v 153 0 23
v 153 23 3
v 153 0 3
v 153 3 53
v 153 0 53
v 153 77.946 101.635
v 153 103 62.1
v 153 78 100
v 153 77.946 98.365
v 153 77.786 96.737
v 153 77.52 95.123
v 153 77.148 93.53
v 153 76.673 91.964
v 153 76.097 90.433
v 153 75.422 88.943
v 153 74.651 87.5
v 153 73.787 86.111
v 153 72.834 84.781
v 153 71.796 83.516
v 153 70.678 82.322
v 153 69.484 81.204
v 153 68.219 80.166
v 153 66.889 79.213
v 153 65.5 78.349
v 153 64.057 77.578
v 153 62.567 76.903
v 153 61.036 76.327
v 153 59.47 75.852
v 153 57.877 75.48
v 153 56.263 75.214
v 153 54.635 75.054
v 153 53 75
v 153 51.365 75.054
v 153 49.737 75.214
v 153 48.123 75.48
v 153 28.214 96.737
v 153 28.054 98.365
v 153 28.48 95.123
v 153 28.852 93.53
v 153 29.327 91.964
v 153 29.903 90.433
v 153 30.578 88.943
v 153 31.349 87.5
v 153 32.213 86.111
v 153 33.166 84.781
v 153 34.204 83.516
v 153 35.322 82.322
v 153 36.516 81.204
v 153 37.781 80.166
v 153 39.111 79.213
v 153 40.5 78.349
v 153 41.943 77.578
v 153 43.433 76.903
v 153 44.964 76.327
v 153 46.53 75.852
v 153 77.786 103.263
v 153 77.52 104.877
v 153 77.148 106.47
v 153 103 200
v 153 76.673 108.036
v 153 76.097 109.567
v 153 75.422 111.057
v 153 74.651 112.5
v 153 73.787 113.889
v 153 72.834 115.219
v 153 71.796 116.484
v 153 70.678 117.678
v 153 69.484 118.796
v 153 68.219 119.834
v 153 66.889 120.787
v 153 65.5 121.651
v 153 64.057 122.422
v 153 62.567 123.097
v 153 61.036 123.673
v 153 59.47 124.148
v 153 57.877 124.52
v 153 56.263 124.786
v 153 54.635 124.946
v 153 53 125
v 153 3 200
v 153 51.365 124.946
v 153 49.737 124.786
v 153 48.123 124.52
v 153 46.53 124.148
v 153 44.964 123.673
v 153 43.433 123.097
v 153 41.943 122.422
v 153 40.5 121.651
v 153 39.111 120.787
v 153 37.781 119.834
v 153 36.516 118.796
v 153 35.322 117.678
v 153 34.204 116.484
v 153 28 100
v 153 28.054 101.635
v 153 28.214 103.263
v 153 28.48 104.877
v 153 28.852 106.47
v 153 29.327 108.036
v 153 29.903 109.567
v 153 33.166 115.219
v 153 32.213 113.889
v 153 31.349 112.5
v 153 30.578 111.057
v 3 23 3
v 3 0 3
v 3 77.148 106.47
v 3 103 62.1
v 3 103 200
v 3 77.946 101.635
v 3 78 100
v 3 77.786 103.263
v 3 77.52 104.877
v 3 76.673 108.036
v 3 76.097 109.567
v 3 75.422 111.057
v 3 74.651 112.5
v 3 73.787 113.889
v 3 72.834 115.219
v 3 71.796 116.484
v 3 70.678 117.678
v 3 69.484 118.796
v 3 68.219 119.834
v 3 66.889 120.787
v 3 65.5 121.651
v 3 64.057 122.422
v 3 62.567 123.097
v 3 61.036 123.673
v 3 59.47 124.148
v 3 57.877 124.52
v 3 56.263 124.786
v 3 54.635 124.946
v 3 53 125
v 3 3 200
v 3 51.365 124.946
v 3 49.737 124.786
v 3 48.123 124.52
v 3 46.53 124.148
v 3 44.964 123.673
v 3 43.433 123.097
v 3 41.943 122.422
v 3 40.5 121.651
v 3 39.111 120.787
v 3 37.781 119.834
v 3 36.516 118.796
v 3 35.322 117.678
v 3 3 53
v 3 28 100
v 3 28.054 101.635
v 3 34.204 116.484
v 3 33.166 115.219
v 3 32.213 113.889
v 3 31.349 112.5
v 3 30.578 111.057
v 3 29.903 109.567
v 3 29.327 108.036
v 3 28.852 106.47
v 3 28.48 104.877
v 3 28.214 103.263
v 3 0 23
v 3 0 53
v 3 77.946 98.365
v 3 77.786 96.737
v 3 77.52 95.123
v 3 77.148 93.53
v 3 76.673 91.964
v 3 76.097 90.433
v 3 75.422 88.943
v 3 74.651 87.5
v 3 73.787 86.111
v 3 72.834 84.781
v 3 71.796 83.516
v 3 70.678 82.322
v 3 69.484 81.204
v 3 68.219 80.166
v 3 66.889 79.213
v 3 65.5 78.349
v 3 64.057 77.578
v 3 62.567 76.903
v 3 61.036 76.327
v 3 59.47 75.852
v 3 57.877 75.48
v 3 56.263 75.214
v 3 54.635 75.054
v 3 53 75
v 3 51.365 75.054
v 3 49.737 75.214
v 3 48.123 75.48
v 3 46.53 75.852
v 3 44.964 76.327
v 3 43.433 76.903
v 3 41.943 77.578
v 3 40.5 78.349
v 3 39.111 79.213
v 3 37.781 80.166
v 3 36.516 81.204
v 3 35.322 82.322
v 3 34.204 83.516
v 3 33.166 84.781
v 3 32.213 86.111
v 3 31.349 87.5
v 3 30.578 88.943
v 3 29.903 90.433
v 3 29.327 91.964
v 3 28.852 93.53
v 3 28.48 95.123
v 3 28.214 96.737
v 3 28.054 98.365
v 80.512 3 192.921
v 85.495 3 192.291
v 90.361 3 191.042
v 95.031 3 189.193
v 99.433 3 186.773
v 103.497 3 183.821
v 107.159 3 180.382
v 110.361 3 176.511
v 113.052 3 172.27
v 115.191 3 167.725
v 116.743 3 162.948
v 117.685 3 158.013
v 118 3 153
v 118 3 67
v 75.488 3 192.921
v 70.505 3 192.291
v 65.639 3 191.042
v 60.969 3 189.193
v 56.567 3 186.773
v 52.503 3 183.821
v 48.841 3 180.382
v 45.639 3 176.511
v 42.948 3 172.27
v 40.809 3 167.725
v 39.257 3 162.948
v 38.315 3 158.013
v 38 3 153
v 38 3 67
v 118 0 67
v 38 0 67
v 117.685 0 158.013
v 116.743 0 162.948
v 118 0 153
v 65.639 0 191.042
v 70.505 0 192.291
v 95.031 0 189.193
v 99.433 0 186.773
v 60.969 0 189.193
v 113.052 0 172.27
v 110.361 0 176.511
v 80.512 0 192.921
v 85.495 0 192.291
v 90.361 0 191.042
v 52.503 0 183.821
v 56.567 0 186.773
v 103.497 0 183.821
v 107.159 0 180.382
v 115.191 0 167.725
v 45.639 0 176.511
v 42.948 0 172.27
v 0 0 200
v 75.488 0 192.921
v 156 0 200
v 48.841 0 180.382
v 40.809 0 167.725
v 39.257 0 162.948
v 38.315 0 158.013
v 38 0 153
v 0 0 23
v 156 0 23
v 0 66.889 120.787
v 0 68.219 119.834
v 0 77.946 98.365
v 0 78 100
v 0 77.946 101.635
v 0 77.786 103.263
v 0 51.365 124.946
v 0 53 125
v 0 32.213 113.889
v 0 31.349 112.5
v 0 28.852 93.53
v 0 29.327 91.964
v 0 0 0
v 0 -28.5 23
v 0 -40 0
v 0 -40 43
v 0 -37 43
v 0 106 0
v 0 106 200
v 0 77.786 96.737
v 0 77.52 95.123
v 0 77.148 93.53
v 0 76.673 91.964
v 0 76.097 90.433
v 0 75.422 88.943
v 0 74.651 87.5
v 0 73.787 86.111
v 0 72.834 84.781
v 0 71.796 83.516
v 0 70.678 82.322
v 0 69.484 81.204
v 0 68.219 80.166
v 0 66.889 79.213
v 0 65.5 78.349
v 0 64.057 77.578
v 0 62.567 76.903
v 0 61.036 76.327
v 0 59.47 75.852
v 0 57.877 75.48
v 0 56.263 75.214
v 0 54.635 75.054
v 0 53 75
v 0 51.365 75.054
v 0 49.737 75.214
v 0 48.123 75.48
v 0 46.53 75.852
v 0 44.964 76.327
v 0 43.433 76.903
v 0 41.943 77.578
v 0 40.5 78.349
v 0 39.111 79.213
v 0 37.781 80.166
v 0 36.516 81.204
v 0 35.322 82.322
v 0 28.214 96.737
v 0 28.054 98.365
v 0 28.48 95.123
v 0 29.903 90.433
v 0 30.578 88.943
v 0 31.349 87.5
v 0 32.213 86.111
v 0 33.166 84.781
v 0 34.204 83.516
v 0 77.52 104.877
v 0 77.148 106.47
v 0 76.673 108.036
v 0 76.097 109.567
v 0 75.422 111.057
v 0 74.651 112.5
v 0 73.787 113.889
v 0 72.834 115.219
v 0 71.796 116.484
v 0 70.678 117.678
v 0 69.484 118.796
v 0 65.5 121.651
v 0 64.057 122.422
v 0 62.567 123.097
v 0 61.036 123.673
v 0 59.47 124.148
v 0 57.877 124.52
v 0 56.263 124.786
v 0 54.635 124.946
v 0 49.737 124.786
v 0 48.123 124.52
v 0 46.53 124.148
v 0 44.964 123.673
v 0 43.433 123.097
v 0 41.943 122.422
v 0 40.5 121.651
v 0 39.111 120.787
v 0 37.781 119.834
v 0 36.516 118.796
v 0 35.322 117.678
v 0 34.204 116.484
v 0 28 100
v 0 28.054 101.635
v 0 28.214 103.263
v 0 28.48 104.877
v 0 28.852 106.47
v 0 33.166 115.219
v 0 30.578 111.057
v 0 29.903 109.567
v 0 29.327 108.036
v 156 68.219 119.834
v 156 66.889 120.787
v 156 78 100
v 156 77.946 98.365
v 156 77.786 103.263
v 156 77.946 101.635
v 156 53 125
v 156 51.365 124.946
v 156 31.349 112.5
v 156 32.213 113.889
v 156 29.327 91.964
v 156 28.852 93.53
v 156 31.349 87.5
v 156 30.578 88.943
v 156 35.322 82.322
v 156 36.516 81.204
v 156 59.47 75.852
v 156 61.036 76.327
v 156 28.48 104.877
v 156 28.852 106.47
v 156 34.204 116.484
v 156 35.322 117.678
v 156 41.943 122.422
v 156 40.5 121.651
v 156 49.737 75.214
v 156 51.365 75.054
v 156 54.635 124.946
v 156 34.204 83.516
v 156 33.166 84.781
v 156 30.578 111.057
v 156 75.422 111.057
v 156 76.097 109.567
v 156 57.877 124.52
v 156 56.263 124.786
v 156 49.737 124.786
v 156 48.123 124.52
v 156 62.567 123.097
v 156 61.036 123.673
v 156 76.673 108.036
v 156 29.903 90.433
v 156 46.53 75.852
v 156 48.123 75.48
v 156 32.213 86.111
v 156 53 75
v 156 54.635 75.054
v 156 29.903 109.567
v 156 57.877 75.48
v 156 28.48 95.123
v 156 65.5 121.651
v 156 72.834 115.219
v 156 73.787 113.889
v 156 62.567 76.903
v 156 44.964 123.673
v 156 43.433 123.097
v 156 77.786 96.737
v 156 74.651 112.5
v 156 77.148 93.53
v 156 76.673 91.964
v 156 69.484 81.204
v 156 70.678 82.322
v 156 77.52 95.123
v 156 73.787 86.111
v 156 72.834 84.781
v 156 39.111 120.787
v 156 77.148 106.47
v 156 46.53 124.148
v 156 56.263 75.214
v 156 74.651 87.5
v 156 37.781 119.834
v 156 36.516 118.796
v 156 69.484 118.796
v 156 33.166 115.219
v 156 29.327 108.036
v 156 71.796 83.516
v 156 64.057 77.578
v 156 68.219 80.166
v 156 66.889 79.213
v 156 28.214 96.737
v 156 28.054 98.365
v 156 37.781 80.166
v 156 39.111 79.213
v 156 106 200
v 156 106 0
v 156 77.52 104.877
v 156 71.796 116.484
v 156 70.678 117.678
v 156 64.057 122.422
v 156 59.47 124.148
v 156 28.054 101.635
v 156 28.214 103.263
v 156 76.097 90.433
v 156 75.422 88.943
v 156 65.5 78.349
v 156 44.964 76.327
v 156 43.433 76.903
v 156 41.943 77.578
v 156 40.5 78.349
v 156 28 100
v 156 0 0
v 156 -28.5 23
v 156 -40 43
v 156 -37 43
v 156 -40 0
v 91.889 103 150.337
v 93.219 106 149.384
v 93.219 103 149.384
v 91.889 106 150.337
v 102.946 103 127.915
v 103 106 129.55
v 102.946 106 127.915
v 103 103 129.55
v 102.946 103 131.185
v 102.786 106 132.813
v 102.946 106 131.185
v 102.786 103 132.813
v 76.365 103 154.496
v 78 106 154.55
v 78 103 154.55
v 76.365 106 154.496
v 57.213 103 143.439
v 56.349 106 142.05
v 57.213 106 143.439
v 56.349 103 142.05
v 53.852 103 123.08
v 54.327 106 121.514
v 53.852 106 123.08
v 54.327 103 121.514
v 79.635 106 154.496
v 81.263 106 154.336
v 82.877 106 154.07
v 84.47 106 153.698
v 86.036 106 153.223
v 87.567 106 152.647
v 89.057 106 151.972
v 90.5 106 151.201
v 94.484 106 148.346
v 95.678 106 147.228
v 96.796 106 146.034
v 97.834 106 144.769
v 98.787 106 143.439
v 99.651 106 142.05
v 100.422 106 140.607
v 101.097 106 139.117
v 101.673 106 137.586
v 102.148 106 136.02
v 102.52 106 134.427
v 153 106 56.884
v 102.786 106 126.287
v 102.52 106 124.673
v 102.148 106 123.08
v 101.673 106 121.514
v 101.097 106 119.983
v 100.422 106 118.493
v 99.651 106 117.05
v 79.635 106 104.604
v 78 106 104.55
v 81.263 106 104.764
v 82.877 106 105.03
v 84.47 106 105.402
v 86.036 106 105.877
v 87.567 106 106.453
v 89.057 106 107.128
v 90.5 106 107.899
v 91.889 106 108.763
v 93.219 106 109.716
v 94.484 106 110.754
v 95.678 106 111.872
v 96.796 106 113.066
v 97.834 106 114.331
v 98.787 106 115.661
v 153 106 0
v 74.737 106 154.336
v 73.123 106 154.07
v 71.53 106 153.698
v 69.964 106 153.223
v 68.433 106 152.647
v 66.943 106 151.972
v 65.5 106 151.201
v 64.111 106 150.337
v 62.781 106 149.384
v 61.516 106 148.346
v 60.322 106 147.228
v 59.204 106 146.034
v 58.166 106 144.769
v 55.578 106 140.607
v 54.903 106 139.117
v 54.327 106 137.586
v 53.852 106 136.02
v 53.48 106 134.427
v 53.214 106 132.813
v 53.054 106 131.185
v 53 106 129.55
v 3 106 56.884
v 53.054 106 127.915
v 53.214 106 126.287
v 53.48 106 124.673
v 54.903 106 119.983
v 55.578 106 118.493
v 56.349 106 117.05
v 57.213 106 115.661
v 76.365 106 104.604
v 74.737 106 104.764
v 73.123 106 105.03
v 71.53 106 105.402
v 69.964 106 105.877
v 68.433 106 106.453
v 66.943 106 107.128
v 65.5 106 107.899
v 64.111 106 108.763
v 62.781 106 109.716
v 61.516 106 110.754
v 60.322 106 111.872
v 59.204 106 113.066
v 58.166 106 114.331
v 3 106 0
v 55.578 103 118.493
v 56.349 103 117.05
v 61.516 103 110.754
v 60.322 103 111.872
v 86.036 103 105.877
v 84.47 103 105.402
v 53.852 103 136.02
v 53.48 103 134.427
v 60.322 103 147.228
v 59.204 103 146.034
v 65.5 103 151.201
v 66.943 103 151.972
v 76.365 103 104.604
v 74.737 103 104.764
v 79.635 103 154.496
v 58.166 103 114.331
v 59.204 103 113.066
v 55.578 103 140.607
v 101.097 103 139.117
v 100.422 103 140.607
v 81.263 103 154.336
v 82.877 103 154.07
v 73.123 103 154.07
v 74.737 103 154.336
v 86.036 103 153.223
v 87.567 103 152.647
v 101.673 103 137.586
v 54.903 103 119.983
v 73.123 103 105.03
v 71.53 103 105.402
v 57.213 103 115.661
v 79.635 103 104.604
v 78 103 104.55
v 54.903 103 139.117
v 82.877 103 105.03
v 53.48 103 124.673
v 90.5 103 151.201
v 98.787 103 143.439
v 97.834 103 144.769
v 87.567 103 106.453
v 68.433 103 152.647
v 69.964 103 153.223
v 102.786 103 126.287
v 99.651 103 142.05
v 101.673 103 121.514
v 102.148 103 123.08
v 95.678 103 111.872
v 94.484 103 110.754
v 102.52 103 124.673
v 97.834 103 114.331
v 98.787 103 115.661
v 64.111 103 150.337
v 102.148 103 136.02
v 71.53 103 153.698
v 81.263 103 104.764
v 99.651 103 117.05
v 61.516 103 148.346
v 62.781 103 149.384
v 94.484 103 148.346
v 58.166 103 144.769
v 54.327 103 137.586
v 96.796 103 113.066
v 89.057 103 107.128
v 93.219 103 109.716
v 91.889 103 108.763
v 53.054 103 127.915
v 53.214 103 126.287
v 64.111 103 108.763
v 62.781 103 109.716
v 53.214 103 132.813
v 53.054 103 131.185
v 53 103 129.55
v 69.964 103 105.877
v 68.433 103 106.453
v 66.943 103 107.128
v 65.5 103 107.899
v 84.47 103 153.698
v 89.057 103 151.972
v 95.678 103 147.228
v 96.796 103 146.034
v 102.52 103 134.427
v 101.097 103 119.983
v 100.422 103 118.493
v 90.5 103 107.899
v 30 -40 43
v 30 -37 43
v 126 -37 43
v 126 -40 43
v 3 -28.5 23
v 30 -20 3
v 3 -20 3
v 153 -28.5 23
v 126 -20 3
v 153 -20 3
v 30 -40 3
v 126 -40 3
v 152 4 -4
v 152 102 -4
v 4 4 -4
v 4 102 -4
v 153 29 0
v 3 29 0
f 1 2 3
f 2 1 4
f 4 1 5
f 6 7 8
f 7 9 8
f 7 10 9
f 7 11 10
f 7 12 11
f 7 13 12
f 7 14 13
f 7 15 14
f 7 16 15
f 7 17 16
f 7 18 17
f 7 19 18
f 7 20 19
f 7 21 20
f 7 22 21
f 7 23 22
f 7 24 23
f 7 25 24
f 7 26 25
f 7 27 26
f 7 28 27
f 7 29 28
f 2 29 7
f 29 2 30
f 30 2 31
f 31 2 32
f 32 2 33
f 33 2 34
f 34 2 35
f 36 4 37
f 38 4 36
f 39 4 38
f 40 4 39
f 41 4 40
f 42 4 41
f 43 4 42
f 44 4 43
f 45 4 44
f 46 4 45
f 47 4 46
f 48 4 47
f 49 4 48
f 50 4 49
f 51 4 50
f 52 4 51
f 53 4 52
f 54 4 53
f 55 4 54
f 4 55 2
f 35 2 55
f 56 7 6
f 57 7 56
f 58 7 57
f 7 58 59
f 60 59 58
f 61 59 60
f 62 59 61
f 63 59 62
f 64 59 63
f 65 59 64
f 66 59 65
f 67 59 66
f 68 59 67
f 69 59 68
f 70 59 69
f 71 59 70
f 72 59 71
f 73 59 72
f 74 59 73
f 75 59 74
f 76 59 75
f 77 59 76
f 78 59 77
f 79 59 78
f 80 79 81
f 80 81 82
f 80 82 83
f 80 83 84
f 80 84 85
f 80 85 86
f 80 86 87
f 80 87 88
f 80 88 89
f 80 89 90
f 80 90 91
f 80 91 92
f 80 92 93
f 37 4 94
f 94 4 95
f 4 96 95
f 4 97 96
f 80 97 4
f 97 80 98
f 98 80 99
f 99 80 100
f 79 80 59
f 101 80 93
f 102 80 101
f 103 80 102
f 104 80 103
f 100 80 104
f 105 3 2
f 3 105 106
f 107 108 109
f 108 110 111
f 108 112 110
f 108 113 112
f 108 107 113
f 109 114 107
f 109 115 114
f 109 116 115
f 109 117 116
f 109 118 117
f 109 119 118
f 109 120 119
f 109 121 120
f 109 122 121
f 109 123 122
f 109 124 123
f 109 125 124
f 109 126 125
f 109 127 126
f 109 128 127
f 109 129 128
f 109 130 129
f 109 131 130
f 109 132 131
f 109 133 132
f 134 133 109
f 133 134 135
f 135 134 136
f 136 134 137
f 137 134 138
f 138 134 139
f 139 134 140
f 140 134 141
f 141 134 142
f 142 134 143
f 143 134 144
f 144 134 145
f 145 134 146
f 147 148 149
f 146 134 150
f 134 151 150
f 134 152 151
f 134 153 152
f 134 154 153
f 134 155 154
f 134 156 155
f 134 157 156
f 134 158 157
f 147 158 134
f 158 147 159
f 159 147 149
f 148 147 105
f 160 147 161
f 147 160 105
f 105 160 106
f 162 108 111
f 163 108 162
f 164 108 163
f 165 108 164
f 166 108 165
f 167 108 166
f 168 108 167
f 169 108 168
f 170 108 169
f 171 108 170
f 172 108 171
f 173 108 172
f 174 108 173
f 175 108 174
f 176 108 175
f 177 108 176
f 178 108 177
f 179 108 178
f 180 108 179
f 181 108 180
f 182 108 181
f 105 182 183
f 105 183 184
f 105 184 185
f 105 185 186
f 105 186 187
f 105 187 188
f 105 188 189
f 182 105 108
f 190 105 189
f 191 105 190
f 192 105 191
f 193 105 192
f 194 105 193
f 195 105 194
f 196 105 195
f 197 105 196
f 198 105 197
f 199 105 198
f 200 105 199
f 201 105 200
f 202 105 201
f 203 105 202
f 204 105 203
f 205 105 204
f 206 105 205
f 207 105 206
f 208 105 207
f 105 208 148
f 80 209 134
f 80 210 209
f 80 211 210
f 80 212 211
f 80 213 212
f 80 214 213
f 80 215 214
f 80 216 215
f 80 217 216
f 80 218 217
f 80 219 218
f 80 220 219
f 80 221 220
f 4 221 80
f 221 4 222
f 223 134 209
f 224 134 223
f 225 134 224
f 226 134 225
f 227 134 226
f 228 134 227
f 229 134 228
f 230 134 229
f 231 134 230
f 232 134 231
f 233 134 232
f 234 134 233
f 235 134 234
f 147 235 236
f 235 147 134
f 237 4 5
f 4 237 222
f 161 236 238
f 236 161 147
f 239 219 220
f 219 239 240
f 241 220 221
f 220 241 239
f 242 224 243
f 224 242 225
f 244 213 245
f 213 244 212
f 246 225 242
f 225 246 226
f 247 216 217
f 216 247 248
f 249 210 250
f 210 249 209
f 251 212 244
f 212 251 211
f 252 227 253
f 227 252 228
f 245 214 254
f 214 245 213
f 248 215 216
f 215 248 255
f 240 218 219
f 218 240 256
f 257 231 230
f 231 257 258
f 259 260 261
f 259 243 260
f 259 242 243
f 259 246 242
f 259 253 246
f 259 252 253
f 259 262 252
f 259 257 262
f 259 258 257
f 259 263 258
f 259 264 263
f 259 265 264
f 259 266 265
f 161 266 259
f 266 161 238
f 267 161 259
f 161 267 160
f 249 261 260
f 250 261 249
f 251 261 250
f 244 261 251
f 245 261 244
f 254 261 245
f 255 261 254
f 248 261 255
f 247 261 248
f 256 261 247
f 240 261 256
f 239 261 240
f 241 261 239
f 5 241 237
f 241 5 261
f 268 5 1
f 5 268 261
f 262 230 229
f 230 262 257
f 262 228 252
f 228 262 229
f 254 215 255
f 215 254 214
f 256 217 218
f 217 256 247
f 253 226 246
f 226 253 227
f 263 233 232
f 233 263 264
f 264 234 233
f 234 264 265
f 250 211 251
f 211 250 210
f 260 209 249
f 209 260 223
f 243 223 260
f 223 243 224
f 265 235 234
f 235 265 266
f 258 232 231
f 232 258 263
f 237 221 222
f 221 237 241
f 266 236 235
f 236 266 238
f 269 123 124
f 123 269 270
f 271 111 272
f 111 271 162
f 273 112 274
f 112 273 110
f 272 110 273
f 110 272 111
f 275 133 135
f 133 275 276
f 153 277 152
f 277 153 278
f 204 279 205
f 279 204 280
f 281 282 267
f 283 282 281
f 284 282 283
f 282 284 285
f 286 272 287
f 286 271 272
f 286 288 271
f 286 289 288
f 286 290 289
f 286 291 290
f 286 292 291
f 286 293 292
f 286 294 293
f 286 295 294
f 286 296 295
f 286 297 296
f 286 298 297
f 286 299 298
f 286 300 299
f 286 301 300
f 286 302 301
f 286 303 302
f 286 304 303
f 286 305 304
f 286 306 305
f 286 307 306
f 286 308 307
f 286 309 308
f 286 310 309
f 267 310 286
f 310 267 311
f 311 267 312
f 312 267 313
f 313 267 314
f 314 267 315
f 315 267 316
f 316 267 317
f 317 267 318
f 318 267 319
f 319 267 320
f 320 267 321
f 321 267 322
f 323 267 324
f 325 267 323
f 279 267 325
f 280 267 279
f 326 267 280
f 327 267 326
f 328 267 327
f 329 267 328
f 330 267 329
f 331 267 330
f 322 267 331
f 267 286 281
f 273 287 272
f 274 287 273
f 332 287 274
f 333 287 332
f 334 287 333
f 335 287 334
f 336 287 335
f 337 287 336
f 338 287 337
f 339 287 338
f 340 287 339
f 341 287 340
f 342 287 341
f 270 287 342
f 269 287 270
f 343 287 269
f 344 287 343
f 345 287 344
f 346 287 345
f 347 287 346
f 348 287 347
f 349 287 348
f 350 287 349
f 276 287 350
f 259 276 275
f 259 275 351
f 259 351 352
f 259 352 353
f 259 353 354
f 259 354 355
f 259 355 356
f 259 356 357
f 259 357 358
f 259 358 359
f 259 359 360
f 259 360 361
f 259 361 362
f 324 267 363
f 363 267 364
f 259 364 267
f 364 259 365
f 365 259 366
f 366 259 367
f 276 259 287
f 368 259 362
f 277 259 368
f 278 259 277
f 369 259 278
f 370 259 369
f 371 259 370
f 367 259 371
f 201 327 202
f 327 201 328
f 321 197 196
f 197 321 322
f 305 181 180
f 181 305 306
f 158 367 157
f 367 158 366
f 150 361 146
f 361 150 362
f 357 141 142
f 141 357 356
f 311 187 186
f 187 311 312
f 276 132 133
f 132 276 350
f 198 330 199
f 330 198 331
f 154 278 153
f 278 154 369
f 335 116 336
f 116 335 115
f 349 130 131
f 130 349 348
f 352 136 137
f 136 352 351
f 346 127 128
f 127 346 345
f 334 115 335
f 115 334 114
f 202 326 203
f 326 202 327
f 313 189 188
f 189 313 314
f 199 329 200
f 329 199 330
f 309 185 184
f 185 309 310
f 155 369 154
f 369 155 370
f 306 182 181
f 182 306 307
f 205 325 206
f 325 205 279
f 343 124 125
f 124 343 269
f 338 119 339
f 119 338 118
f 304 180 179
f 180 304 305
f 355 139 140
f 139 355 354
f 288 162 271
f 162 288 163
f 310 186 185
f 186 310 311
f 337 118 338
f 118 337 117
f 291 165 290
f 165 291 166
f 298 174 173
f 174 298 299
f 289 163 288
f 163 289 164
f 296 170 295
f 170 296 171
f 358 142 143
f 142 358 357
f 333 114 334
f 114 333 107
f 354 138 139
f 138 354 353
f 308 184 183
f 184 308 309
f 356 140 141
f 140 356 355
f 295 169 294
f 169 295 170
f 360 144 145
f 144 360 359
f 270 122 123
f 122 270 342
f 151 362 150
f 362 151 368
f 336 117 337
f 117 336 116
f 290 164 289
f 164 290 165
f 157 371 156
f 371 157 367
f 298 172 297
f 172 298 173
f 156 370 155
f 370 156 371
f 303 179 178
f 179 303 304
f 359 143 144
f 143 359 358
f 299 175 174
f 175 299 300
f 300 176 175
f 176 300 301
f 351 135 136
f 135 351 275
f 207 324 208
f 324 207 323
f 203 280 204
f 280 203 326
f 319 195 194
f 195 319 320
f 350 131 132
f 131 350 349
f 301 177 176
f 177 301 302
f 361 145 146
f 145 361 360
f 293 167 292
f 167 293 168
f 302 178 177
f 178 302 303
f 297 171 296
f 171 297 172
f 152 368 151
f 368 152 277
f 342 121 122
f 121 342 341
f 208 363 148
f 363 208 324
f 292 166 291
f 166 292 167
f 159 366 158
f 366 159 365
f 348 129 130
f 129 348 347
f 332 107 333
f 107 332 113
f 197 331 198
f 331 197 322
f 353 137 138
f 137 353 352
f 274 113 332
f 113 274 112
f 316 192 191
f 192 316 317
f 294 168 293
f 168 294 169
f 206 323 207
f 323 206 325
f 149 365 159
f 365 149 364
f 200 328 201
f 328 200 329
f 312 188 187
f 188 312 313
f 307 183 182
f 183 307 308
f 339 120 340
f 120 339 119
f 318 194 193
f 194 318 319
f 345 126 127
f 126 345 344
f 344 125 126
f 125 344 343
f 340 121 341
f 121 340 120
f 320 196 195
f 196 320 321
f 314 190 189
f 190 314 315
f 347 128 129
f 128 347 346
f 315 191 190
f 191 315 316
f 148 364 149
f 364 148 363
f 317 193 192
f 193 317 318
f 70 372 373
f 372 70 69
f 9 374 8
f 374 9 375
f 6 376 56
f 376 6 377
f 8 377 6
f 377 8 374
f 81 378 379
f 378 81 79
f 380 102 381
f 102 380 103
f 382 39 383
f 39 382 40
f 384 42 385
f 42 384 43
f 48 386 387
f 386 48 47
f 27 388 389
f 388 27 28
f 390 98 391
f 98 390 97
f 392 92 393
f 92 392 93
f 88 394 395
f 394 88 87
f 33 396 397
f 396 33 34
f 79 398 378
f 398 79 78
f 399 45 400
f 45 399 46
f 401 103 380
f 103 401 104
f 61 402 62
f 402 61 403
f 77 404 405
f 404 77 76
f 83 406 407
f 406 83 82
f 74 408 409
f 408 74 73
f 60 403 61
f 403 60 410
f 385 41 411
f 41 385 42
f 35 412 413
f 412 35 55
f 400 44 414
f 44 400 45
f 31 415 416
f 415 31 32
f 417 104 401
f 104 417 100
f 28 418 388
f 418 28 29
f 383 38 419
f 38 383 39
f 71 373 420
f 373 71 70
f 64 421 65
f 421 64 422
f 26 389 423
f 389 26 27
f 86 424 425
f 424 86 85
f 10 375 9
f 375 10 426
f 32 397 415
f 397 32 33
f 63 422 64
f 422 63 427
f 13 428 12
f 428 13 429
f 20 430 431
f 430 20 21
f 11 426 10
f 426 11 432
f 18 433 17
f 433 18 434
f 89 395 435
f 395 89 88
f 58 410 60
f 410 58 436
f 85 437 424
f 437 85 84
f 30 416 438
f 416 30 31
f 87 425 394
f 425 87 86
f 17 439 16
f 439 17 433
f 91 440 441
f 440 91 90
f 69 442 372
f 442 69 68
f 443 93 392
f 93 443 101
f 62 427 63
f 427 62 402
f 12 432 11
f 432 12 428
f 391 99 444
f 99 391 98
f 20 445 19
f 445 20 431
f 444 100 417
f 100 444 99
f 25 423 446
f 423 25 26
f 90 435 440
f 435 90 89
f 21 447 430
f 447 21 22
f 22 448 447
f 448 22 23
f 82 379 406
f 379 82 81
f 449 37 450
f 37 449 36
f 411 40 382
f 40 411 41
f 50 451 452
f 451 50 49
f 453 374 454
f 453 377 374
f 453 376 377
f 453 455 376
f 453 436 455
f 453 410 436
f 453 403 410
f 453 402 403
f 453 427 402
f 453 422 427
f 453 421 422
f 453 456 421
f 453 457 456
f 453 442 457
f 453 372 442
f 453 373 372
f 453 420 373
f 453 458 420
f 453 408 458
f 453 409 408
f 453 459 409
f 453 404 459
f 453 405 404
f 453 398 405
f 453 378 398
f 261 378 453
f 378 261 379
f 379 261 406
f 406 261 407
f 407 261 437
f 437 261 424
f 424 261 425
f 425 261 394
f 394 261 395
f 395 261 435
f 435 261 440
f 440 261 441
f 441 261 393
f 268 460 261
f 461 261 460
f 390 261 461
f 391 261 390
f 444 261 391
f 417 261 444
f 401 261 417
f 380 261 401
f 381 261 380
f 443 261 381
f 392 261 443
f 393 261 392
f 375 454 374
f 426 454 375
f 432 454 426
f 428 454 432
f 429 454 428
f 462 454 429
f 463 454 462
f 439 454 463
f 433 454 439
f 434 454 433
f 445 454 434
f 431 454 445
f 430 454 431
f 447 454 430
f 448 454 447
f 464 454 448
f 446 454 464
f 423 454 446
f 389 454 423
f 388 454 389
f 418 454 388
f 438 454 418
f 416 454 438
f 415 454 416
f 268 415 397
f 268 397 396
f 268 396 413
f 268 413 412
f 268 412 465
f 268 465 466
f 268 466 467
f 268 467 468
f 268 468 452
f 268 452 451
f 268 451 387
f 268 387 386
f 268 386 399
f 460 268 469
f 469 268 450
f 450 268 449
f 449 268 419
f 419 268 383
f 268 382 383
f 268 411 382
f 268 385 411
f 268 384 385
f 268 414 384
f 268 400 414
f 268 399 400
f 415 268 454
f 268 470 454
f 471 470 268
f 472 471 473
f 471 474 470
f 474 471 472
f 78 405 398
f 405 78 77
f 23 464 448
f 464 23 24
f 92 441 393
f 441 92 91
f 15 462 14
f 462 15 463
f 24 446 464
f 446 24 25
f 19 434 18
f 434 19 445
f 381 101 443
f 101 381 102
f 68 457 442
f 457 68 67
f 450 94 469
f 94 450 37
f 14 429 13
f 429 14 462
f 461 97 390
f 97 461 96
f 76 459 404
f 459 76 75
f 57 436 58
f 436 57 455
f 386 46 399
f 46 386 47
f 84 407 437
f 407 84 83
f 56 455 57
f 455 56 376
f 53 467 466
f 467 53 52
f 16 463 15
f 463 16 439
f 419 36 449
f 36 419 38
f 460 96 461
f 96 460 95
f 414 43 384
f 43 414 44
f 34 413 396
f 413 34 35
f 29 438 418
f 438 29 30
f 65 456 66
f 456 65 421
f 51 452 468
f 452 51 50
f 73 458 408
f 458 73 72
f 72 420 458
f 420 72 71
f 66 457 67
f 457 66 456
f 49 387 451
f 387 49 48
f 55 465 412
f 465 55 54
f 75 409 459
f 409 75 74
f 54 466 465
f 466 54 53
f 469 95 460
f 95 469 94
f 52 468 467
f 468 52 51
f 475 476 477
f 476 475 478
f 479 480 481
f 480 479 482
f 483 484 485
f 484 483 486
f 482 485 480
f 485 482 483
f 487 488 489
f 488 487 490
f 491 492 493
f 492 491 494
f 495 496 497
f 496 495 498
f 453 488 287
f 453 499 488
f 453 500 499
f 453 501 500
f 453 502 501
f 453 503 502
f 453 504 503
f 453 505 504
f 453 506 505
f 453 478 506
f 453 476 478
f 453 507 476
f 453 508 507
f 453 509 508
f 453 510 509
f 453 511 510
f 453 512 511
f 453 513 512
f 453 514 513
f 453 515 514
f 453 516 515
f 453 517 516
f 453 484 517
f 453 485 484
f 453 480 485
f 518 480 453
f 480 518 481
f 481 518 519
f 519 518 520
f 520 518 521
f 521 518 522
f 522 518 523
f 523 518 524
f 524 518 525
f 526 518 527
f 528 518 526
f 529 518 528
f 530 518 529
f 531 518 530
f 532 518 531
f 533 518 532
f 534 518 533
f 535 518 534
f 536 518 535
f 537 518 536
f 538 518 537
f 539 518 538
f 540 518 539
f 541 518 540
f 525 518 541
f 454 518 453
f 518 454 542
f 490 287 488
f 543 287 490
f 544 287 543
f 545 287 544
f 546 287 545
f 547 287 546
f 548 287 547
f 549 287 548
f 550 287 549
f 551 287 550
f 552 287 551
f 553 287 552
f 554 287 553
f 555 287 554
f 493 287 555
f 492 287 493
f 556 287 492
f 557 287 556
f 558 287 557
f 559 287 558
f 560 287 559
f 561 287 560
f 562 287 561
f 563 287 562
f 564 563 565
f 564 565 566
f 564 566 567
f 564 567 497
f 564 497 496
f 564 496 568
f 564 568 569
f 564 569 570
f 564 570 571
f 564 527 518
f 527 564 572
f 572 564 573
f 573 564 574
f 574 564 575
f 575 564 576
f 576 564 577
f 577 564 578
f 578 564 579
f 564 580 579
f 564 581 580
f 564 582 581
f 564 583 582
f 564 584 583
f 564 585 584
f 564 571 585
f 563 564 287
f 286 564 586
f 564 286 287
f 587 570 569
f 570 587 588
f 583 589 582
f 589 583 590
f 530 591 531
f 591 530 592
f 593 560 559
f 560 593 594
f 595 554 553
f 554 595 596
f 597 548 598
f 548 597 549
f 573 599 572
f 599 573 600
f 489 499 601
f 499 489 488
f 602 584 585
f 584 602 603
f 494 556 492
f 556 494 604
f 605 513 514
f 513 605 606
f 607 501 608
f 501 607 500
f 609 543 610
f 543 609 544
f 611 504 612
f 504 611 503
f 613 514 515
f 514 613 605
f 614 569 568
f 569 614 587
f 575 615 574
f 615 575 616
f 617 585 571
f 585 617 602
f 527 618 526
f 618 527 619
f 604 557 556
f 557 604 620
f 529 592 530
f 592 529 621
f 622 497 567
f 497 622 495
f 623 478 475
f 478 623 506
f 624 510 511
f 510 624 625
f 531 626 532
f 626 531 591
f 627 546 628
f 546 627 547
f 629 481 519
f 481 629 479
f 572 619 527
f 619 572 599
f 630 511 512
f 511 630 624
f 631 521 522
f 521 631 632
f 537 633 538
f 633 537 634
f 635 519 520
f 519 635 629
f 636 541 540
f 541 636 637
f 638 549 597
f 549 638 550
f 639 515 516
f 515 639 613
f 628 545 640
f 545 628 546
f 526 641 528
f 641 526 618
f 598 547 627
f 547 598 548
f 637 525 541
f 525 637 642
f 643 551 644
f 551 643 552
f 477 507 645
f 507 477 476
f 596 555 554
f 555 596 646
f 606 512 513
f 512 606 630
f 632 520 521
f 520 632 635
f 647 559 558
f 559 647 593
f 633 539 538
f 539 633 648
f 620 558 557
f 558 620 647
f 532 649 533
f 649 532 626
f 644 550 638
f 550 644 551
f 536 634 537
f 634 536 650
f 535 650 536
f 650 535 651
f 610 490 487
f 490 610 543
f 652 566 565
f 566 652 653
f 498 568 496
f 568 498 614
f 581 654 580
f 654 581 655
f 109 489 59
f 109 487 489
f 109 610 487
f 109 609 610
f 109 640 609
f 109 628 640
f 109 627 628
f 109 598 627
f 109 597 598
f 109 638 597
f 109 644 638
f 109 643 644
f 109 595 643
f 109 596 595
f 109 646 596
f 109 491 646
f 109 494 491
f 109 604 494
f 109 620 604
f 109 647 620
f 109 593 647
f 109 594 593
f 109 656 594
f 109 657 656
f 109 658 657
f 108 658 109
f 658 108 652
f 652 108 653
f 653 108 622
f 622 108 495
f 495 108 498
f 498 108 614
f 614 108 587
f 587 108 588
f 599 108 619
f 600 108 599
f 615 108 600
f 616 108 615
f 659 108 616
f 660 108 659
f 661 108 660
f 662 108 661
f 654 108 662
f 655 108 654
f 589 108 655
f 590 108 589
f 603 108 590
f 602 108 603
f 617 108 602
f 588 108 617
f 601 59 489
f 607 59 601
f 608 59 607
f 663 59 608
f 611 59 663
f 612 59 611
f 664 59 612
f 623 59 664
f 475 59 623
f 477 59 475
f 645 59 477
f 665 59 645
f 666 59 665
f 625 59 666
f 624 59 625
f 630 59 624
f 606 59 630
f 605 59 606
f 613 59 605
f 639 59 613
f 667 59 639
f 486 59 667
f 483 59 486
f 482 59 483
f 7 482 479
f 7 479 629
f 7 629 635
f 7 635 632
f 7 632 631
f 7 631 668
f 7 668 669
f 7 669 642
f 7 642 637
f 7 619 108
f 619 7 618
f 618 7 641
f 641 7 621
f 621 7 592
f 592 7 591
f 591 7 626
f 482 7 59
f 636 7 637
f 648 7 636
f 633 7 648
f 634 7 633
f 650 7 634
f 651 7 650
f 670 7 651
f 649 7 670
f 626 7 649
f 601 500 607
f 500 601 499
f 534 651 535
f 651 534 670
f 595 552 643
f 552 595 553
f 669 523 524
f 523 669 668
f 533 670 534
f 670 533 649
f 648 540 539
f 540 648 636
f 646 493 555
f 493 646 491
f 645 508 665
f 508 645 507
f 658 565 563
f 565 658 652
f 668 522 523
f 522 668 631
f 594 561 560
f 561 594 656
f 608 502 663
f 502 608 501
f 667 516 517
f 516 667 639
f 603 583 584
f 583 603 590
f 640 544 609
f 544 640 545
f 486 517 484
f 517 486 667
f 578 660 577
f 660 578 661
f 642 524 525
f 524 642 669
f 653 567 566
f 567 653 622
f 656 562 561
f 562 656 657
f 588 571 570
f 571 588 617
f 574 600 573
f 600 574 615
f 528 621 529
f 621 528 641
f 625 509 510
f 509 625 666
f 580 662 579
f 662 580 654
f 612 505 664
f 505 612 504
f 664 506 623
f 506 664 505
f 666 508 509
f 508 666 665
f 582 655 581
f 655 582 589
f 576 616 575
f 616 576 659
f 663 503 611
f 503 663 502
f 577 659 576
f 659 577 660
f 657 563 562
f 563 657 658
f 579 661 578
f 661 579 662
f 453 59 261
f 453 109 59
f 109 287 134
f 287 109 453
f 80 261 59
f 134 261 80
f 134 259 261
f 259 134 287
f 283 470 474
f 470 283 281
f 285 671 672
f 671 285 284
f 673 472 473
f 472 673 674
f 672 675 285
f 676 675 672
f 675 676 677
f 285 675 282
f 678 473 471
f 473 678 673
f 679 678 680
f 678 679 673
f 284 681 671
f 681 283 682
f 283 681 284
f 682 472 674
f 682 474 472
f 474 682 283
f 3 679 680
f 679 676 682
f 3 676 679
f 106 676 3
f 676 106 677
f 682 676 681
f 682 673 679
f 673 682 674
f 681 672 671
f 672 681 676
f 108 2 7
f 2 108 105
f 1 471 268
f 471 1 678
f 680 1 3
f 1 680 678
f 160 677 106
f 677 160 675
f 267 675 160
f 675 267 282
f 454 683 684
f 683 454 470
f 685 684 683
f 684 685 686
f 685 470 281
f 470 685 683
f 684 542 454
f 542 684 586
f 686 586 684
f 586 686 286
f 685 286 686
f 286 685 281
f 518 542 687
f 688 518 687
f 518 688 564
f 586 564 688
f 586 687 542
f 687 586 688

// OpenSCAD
/* [Container Parameters] */
Inner_Width = 150;  // Width of the container in millimeters
Inner_Depth = 100;  // Depth of the container in millimeters
Outer_Height = 200  ;  // Height of the container in millimeters
Wall_Thickness = 3;  // Thickness of the container walls in millimeters
Opening_Height = 50;  // Height of the opening at the top in millimeters
Add_Inset_Bottom = true; 

/* [Ramp Parameters] */
// Ratio of the ramp height to the inner height
Ramp_Height_Ratio = 0.3; //[0 : 0.01 : 0.99]
// Ratio of the ramp depth to the inner depth 
Ramp_Depth_Ratio = 0.8;  //[0 : 0.01 : 0.99]

/* [Landing and Stopper Parameters] */
Landing_Length = 40; // Length of the landing in millimeters
Stopper_Length = 20; // Length of the stopper ramp in millimeters
Stopper_Height = 40; // Height of the stopper ramp in millimeters
Stopper_Bar_Width = 30; // Width of the stopper bars in millimeters


/* [Front Cutout Parameters] */
// If true, the container has a front top cutout
Add_Top_Cutout = false; 
// If true, you customize the front vertical cutout
Customize_Front_Cutout = true;
// Width of the front vertical cutout in millimeters
Front_VC_Width = 80; // [0 : 1 : 500]
// Height of the front vertical cutout in millimeters
Front_VC_Height = 200; // [0 : 1 : 500]
// Height of the lower triangular cutout in millimeters
Front_LTC_Height = 30;// [0 : 1 : 500]
// Height of the front top cutout in millimeters
Top_Cutout_Height = 20; // [0 : 1 : 500]

/* [Side Cutout Parameters] */
Add_Side_Cutouts = true;
// Width of the side cutouts in millimeters
Side_Cutout_Width = 50; // [0 : 1 : 400]
// Height of the side cutouts in millimeters
Side_Cutout_Height = 50; // [0 : 1 : 400]
// Side_Cutout_Angle = 0; // [-90 : 1 : 90]


/* [Back Cutout Parameters] */
Add_Back_Cutouts = true;
// Width of the back cutouts in millimeters
Back_Cutout_Width = 50; // [0 : 1 : 400]
// Height of the back cutouts in millimeters
Back_Cutout_Height = 50; // [0 : 1 : 400]
// Back_Cutout_Angle = 0; // [-90 : 1 : 90]

/* [Bottom Floor Cutout Parameters] */
Add_Bottom_Cutouts = false;
Bottom_Cutout_Width = 50; // [0 : 1 : 400]
Bottom_Cutout_Depth = 20; // [0 : 1 : 400

/* [Other Cutout Parameters] */
// If true, the bottom of the container is solid; if false, it has a cutout
Solid_Bottom = false;



/* [Hidden] */
Outer_Width = Inner_Width + 2 * Wall_Thickness;
Outer_Depth = Inner_Depth + 2 * Wall_Thickness;
Inner_Height = Outer_Height - Wall_Thickness;


main();
// internalRamp();
// stopper();
// landing();
// color("blue") backCutouts();
// color("red") bottomCutouts();

module main(){
    difference() {
        union(){
            difference() {
                // Outer container
                cube([Outer_Width, Outer_Depth, Outer_Height]);
                // Inner hollow space
                translate([Wall_Thickness, Wall_Thickness, Wall_Thickness])
                    cube([Inner_Width, Inner_Depth, Inner_Height]);
                translate([Wall_Thickness, 0, Wall_Thickness])
                    cube([Inner_Width, Wall_Thickness*2, Opening_Height], center=false);
                frontCutout();   
                if(Add_Side_Cutouts){
                    sideCutouts();
                }
                if(Add_Back_Cutouts){
                    backCutouts();
                }
                
            }
            internalRamp();
            landing();
            translate([0, -Landing_Length+Stopper_Length, 0]) stopper();
            if(Add_Inset_Bottom){
                color("red") insetBottom();
            }
            
        }
        if(!Solid_Bottom){
            translate([0, Wall_Thickness*2, -Wall_Thickness]) internalRamp();
        }
        if(Add_Bottom_Cutouts){
            bottomCutouts();
        }
    }
}

module insetBottom(){
    translate([Wall_Thickness*0, Wall_Thickness*0, 0]){
        hull(){
            cube([Outer_Width, Outer_Depth, 0.1], center=false);
            translate([Wall_Thickness+1, Wall_Thickness+1, -4]) cube([Outer_Width-Wall_Thickness*2-2, Outer_Depth-Wall_Thickness*2-2, 0.1], center=false);
        }
    }
    
    

}

module frontCutout() { 
    lowerTriangleHeight = Customize_Front_Cutout ? Front_LTC_Height : (Inner_Height - Opening_Height)/5;
    lowerTriangleBase = Inner_Width;
    higherTriangleBase = Customize_Front_Cutout ? lowerTriangleBase/2 : lowerTriangleBase/2;
    cylRadius = Customize_Front_Cutout ? Front_VC_Width/2 : higherTriangleBase/3;
    higherTriangleHeight = Customize_Front_Cutout ? Front_VC_Height-Opening_Height : lowerTriangleHeight*4;
    
    // if(Customize_Front_Cutout){
    //     lowerTriangleHeight = (Inner_Height - Opening_Height)/5;
    //     lowerTriangleBase = Inner_Width;
    //     higherTriangleHeight = lowerTriangleHeight*4;
    //     higherTriangleBase = lowerTriangleBase/2;
    //     cylRadius = Front_VC_Width/2;
    // } else {
    //     lowerTriangleHeight = (Inner_Height - Opening_Height)/5;
    //     lowerTriangleBase = Inner_Width;
    //     higherTriangleHeight = lowerTriangleHeight*4;
    //     higherTriangleBase = lowerTriangleBase/2;
    //     cylRadius = higherTriangleBase/3;
    // }
    

    translate([Wall_Thickness, 0, Wall_Thickness])
        cube([Inner_Width, Wall_Thickness*2, Opening_Height], center=false);
    translate([Wall_Thickness + Inner_Width/2, Wall_Thickness, Wall_Thickness+Opening_Height]) 
        rotate([90,0,0]) 
            iso_tri_prism(base_w=lowerTriangleBase, tri_h=lowerTriangleHeight, depth=Wall_Thickness*2);
    // translate([Wall_Thickness + Inner_Width/2, Wall_Thickness*2, Wall_Thickness+Opening_Height+lowerTriangleHeight/4]) 
    //     rotate([90,0,0]) 
    //         iso_tri_prism(base_w=higherTriangleBase, tri_h=higherTriangleHeight, depth=Wall_Thickness*2);

    translate([Wall_Thickness + Inner_Width/2, Wall_Thickness*2, Wall_Thickness+Opening_Height+lowerTriangleHeight+higherTriangleHeight-cylRadius*2]) 
        rotate([90,0,0]) 
            cylinder(h=Wall_Thickness*2, r=cylRadius, center=false, $fn=50);

    translate([Outer_Width/2-cylRadius, -Wall_Thickness, Wall_Thickness+Opening_Height]) 
        rotate([0,0,0]) 
            cube([cylRadius*2, Wall_Thickness*2, higherTriangleHeight+lowerTriangleHeight-cylRadius*2], center=false);

    if(Add_Top_Cutout){
        tcHeight = Customize_Front_Cutout ? Top_Cutout_Height : Opening_Height;
        translate([Wall_Thickness, -Wall_Thickness, Outer_Height-tcHeight]) 
            rotate([0,0,0]) 
                cube([Inner_Width, Wall_Thickness*2, tcHeight], center=false);
    }


}



module capsule3d(w=40, total_h=80, depth=5, $fn=96) {
    r = w/2;
    rect_h = max(0, total_h - 2*r);
    union() {
        translate([0, r, 0]) cube([w, rect_h, depth], center=false);          // rectangle centered at origin
        translate([r, total_h-r, 0]) cylinder(h=depth, r=r, $fn=$fn); // top circle, center on top edge
        translate([r, r, 0]) cylinder(h=depth, r=r, $fn=$fn); // bottom circle, center on bottom edge
    }
}


module sideCutouts() {
    sideCutoutWidth = Side_Cutout_Width;
    sideCutoutHeight = Side_Cutout_Height;
    // angle = Side_Cutout_Angle;
    translate([0, Outer_Depth/2-sideCutoutWidth/2, Outer_Height/2-sideCutoutHeight/2]) rotate([90, 0, 90]) capsule3d(w=sideCutoutWidth, total_h=sideCutoutHeight, depth=Wall_Thickness, $fn=96);
    translate([Outer_Width-Wall_Thickness, Outer_Depth/2-sideCutoutWidth/2, Outer_Height/2-sideCutoutHeight/2]) rotate([90, 0, 90]) capsule3d(w=sideCutoutWidth, total_h=sideCutoutHeight, depth=Wall_Thickness, $fn=96);
}

module backCutouts() {
    backCutoutWidth = Back_Cutout_Width;
    backCutoutHeight = Back_Cutout_Height;
    // angle = Back_Cutout_Angle;
    translate([Outer_Width/2-backCutoutWidth/2, Outer_Depth, Outer_Height/2-backCutoutHeight/2+Inner_Height*Ramp_Height_Ratio/2]) rotate([90, 0, 0]) capsule3d(w=backCutoutWidth, total_h=backCutoutHeight, depth=Wall_Thickness, $fn=96);
}

module bottomCutouts() {
    bottomCutoutWidth = Bottom_Cutout_Width;
    bottomCutoutDepth = Bottom_Cutout_Depth;
    bottomCutoutHeight = Wall_Thickness;
    translate([Outer_Width/2-bottomCutoutWidth/2, Outer_Depth/2-bottomCutoutDepth/2-Wall_Thickness, 0]) rotate([0, 0, 0]) cube([bottomCutoutWidth, bottomCutoutDepth, bottomCutoutHeight], center=false);
}

// lowerTriangleHeight = (Inner_Height - Opening_Height)/5;
// higherTriangleHeight = lowerTriangleHeight*4;
// lowerTriangleBase = Inner_Width;
// higherTriangleBase = lowerTriangleBase/2;
// cylRadius = higherTriangleBase/4;
    

// translate([Outer_Width/2-higherTriangleBase/4, -Wall_Thickness, Wall_Thickness+Opening_Height]) 
//         rotate([0,0,0]) 
//             color("blue") cube([higherTriangleBase/2, Wall_Thickness*2, higherTriangleHeight+lowerTriangleHeight-cylRadius*2], center=false);

module internalRamp() {
    // rampHeight = Inner_Height/10;
    // rampDepth = Inner_Depth/2;
    
    rampHeight = Inner_Height*Ramp_Height_Ratio;
    rampWidth = Inner_Width;
    rampMinBottom = 0;
    rampDepth = Inner_Depth*Ramp_Depth_Ratio;
    difference(){
        translate([Inner_Width+Wall_Thickness, Inner_Depth+Wall_Thickness, Wall_Thickness])
            rotate([90,0,270])
                linear_extrude(height=rampWidth)
                    polygon(points=[[0,0], [rampDepth,0], [rampDepth,rampMinBottom], [0,rampMinBottom + rampHeight]]);
    }
    
}

module stopper() {
    rampThickness = Stopper_Bar_Width;
    rampWidthOuter = Outer_Width;
    rampWidthInner = rampWidthOuter - rampThickness*2;
    rampMinBottom = Wall_Thickness;
    rampDepth = Stopper_Length;
    rampDepthInner = rampDepth + Wall_Thickness;
    rampMinBottomInner = rampMinBottom + Wall_Thickness;
    rampHeight = rampMinBottom+Stopper_Height;

    difference(){
        translate([0, -rampDepth, 0])
            rotate([90,0,90])
                linear_extrude(height=rampWidthOuter)
                    polygon(points=[[0,0], [rampDepth,0], [rampDepth,rampMinBottom],[Wall_Thickness,rampHeight], [0, rampHeight]]);

        translate([rampThickness, -rampDepth, Wall_Thickness])
            rotate([90,0,90])
                linear_extrude(height=rampWidthInner)
                    polygon(points=[[0,0], [rampDepthInner,0], [rampDepthInner,rampMinBottomInner], [Wall_Thickness,rampHeight], [0, rampHeight - Wall_Thickness]]);
    }
    
}

module landing() {
    landingWidth = Outer_Width;
    landingWidthInner = landingWidth - Wall_Thickness*2;
    landingHeight = Wall_Thickness + Stopper_Height/2;
    landingHeightInner = landingHeight - Wall_Thickness;
    landingDepth = Landing_Length;
    // translate([rampThickness, -rampDepth, Wall_Thickness])
        rotate([90,0,0])
            linear_extrude(height=landingDepth)
                polygon(points=[[0,0], [landingWidth,0], [landingWidth, landingHeight], [landingWidth-Wall_Thickness, landingHeight], [landingWidth-Wall_Thickness, Wall_Thickness], [Wall_Thickness, Wall_Thickness],[Wall_Thickness, landingHeight], [0, landingHeight]]);

}

// Isosceles Triangular Prism
// base_w  = width of the triangle's base (mm)
// tri_h   = height of the triangle from base to apex (mm)
// depth   = extrusion depth (mm) along Z
// center_xy = center the triangle in XY (apex up); if false, base starts at x=0
// center_z  = center the prism along Z during extrusion

module iso_tri_prism(base_w=40, tri_h=30, depth=20, center_xy=true, center_z=false) {
    b = base_w;
    h = tri_h;

    // Define triangle points in the XY plane
    pts = center_xy
        ? [ [-b/2, 0], [ b/2, 0], [0, h] ]              // centered base, apex at +Y
        : [ [0, 0], [ b, 0], [ b/2, h ] ];              // base from x=0..b, apex centered

    linear_extrude(height=depth, center=center_z)
        polygon(points = pts);
}

// ---------- Examples ----------
// Centered triangle, 40×30, extruded 20 mm:
